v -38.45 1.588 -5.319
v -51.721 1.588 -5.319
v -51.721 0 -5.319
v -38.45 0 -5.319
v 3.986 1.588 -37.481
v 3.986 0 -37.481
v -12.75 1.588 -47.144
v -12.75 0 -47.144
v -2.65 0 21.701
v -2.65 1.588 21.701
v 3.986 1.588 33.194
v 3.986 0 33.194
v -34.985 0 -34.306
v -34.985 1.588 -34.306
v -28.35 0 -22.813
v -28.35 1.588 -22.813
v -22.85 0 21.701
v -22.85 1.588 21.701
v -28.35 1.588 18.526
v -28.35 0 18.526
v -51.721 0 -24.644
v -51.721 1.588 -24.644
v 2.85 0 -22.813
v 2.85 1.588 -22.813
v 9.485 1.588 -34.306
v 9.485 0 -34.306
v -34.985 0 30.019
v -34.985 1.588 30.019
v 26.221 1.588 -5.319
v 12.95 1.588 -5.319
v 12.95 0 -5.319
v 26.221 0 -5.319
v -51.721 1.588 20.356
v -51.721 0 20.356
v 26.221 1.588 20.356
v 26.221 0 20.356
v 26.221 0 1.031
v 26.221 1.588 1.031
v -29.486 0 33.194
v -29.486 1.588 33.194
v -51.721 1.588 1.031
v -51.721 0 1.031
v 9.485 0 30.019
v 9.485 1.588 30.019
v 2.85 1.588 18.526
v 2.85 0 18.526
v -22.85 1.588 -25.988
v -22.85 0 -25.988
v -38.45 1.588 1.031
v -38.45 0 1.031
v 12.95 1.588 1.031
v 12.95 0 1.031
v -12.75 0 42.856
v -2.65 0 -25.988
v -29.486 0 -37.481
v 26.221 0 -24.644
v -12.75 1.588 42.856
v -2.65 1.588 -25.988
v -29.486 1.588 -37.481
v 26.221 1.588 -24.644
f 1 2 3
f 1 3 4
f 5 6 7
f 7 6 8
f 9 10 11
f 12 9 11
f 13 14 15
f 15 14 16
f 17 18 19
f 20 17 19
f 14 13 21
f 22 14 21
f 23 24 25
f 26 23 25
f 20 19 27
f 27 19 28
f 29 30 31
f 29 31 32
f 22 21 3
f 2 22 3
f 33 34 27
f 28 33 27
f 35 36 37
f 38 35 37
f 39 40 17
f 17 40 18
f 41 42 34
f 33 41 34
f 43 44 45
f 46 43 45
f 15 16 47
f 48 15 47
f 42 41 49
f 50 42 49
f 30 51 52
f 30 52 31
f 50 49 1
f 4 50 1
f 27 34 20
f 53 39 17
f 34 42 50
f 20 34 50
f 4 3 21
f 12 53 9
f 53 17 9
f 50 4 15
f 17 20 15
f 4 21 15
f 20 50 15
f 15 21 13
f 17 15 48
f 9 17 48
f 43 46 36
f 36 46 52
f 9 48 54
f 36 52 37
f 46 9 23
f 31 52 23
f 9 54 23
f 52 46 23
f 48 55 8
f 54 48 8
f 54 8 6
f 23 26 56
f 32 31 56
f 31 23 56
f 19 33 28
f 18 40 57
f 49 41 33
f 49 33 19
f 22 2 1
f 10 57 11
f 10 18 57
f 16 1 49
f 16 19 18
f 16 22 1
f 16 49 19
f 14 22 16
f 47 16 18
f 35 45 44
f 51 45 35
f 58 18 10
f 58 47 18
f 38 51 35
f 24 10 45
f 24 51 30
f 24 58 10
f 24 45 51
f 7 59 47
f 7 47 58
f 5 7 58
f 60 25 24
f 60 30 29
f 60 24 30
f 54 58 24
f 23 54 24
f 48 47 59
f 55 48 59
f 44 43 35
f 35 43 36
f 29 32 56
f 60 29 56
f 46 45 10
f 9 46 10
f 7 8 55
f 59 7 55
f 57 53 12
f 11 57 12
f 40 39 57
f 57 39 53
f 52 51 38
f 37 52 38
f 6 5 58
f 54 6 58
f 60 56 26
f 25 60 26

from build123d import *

# Parameters (mm, degrees)
BOSS_EXTRUDE1_DEPTH = 1.5875
SKETCH2_W           = 13.27114317
SKETCH2_H           = 6.35
CUT_EXTRUDE1_DEPTH  = 71.000903906


with BuildPart() as part:
    # Sketch1 → Boss-Extrude1 (new body)
    with BuildSketch(Plane(origin=(0, 0, 0), x_dir=(1, 0, 0), z_dir=(0, 1, 0))):
        Polygon((26.221215583, 24.643793134), (-12.749927587, 47.143793134), (-51.721070757, 24.643793134), (-51.721070757, -20.356206866), (-12.749927587, -42.856206866), (26.221215583, -20.356206866), align=None)
    extrude(amount=BOSS_EXTRUDE1_DEPTH)

    # Sketch2 → Cut-Extrude1 (cut, through all)
    with BuildSketch(Plane(origin=(0, 1.5875, 0), x_dir=(1, 0, 0), z_dir=(0, 1, 0))):
        with Locations((19.585643998, 2.143793134)):
            Rectangle(SKETCH2_W, SKETCH2_H)
        Polygon((2.84970307, 22.813146011), (9.485274655, 34.306293134), (3.986013341, 37.481293134), (-2.649558244, 25.988146011), align=None)
        Polygon((-22.85029693, 25.988146011), (-29.485868515, 37.481293134), (-34.985129829, 34.306293134), (-28.349558244, 22.813146011), align=None)
        with Locations((-45.085499172, 2.143793134)):
            Rectangle(SKETCH2_W, SKETCH2_H)
        Polygon((3.986013341, -33.193706866), (9.485274655, -30.018706866), (2.84970307, -18.525559743), (-2.649558244, -21.700559743), align=None)
        Polygon((-34.985129829, -30.018706866), (-29.485868515, -33.193706866), (-22.85029693, -21.700559743), (-28.349558244, -18.525559743), align=None)
    extrude(amount=-CUT_EXTRUDE1_DEPTH, mode=Mode.SUBTRACT)


solid = part.part
